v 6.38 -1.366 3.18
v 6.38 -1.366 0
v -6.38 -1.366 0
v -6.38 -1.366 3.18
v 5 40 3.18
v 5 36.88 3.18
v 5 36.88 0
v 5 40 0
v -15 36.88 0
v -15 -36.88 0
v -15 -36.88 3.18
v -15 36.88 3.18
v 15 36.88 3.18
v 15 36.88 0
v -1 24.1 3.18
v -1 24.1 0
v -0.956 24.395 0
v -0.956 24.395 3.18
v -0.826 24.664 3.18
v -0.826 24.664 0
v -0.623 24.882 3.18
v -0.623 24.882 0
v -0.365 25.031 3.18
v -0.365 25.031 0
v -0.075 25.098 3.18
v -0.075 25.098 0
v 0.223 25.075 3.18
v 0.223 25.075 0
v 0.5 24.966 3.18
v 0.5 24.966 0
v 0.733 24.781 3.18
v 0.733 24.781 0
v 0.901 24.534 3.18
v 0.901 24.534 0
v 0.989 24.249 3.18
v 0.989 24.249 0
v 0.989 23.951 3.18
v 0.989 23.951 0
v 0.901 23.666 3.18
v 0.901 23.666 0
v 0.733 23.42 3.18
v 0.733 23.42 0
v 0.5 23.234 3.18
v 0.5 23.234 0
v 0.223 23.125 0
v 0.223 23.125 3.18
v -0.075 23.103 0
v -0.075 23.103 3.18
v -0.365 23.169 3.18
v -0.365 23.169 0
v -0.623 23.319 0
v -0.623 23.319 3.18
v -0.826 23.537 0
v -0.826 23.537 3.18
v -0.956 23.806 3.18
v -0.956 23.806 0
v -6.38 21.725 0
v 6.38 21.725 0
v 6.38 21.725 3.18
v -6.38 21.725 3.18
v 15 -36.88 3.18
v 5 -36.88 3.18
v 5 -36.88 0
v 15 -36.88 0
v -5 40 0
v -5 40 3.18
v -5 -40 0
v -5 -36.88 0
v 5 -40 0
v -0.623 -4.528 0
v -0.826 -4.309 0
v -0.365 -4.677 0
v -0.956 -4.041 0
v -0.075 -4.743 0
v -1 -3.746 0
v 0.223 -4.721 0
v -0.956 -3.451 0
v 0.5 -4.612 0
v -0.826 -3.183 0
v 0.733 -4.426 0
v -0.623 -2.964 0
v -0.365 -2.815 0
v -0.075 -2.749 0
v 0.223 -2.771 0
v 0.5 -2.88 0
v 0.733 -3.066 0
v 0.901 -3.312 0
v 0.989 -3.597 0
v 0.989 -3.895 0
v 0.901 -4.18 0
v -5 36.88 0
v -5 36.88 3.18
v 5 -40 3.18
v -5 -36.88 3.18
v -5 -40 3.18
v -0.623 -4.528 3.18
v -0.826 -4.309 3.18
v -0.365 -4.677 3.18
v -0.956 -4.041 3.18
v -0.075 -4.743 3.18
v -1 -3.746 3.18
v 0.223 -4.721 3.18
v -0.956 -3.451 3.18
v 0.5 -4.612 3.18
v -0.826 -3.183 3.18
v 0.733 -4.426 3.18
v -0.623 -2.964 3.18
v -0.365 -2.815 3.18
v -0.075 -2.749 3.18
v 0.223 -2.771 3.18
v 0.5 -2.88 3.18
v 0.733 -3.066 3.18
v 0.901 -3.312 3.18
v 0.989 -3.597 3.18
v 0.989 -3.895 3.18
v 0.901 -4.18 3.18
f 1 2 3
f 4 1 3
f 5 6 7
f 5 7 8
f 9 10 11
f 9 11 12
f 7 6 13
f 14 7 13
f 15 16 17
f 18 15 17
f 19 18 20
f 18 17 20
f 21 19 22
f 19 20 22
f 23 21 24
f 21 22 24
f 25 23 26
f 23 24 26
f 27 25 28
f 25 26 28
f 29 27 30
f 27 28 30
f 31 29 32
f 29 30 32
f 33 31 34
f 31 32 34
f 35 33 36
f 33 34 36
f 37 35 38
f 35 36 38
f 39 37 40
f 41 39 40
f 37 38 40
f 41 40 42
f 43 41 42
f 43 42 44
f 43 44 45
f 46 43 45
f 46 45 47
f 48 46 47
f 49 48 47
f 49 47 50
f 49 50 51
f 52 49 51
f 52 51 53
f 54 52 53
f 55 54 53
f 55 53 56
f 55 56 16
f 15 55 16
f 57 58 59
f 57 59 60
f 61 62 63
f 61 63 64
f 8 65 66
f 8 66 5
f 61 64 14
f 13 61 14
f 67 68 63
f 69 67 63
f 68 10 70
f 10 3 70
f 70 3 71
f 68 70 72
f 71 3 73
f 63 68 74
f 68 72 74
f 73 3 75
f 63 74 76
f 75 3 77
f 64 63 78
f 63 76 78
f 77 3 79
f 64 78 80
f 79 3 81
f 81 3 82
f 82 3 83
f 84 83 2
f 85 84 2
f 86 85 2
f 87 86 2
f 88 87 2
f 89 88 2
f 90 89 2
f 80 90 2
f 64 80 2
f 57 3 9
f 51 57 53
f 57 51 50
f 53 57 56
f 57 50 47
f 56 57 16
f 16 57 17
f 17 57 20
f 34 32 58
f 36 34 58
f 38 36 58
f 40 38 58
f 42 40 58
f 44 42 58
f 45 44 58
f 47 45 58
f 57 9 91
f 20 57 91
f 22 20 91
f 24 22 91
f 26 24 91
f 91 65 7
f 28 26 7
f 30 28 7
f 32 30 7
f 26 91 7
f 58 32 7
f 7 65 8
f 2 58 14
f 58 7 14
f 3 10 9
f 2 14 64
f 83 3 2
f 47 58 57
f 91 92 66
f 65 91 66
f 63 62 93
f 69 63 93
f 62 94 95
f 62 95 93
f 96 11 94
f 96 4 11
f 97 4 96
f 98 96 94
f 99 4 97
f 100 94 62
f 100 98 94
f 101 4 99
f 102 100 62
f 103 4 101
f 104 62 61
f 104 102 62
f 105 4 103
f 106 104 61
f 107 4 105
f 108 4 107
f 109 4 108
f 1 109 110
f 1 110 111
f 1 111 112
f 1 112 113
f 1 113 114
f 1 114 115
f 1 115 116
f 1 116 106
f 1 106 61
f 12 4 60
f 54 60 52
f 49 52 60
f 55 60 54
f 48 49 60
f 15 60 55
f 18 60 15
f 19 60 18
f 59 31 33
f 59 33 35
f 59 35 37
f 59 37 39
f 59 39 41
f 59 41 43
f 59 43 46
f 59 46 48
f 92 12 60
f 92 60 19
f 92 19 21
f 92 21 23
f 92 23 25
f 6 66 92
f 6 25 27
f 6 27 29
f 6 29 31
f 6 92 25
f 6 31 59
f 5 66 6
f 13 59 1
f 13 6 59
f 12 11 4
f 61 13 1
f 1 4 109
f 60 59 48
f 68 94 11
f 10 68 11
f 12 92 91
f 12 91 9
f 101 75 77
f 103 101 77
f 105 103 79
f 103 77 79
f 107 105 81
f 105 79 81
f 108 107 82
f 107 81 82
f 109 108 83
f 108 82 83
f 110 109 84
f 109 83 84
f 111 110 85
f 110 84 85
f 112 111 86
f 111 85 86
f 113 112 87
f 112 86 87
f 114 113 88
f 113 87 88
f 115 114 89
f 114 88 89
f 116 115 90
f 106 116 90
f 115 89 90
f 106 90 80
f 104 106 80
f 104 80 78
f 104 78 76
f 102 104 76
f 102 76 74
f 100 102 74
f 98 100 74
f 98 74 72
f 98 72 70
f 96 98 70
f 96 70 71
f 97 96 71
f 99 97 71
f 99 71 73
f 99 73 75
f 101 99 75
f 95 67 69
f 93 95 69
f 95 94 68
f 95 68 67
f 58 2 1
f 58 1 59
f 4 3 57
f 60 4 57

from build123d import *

# Parameters (mm, degrees)
SKETCH2_W               = 30
SKETCH2_H               = 80
BOSS_EXTRUDE1_DEPTH     = 3.18
SKETCH4_W               = 10
SKETCH4_H               = 3.12
CUT_EXTRUDE1_DEPTH      = 3.18
MIRROR2_COPY_1_SKETCH_W = 10
MIRROR2_COPY_1_SKETCH_H = 3.12
MIRROR2_COPY_1_DEPTH    = 3.18
SKETCH5_W               = 12.76
SKETCH5_H               = 23.091347567
CUT_EXTRUDE2_DEPTH      = 3.18
SKETCH6_R               = 1
CUT_EXTRUDE3_DEPTH      = 4.18


with BuildPart() as part:
    # Sketch2 → Boss-Extrude1 (new body)
    with BuildSketch(Plane.XY):
        Rectangle(SKETCH2_W, SKETCH2_H)
    extrude(amount=BOSS_EXTRUDE1_DEPTH)

    # Sketch4 → Cut-Extrude1 (cut)
    with BuildSketch(Plane.XY.offset(3.18)):
        with Locations((10, 38.44)):
            Rectangle(SKETCH4_W, SKETCH4_H)
    cut_extrude1 = extrude(amount=-CUT_EXTRUDE1_DEPTH, mode=Mode.SUBTRACT)

    # Mirror1: Cut-Extrude1 across plane
    add(cut_extrude1.mirror(Plane(origin=(0, 0, 0), x_dir=(0, 0, 1), z_dir=(1, 0, 0))), mode=Mode.SUBTRACT)

    # Mirror2: Cut-Extrude1 across plane
    add(cut_extrude1.mirror(Plane.ZX), mode=Mode.SUBTRACT)

    # Mirror2 copy 1 sketch → Mirror2 copy 1 (cut)
    with BuildSketch(Plane(origin=(0, 0, 3.18), x_dir=(-1, 0, 0), z_dir=(0, 0, 1))):
        with Locations((10, 38.44)):
            Rectangle(MIRROR2_COPY_1_SKETCH_W, MIRROR2_COPY_1_SKETCH_H)
    extrude(amount=-MIRROR2_COPY_1_DEPTH, mode=Mode.SUBTRACT)

    # Sketch5 → Cut-Extrude2 (cut)
    with BuildSketch(Plane(origin=(0, 0, 0), x_dir=(-1, 0, 0), z_dir=(0, 0, -1))):
        with Locations((0, 10.179687203)):
            Rectangle(SKETCH5_W, SKETCH5_H)
    extrude(amount=-CUT_EXTRUDE2_DEPTH, mode=Mode.SUBTRACT)

    # Sketch6 → Cut-Extrude3 (cut, through all)
    with BuildSketch(Plane(origin=(0, 0, 0), x_dir=(-1, 0, 0), z_dir=(0, 0, -1))):
        with Locations((0, 24.100360986)):
            Circle(SKETCH6_R)
        with Locations((0, -3.745986581)):
            Circle(SKETCH6_R)
    extrude(amount=-CUT_EXTRUDE3_DEPTH, mode=Mode.SUBTRACT)


solid = part.part
